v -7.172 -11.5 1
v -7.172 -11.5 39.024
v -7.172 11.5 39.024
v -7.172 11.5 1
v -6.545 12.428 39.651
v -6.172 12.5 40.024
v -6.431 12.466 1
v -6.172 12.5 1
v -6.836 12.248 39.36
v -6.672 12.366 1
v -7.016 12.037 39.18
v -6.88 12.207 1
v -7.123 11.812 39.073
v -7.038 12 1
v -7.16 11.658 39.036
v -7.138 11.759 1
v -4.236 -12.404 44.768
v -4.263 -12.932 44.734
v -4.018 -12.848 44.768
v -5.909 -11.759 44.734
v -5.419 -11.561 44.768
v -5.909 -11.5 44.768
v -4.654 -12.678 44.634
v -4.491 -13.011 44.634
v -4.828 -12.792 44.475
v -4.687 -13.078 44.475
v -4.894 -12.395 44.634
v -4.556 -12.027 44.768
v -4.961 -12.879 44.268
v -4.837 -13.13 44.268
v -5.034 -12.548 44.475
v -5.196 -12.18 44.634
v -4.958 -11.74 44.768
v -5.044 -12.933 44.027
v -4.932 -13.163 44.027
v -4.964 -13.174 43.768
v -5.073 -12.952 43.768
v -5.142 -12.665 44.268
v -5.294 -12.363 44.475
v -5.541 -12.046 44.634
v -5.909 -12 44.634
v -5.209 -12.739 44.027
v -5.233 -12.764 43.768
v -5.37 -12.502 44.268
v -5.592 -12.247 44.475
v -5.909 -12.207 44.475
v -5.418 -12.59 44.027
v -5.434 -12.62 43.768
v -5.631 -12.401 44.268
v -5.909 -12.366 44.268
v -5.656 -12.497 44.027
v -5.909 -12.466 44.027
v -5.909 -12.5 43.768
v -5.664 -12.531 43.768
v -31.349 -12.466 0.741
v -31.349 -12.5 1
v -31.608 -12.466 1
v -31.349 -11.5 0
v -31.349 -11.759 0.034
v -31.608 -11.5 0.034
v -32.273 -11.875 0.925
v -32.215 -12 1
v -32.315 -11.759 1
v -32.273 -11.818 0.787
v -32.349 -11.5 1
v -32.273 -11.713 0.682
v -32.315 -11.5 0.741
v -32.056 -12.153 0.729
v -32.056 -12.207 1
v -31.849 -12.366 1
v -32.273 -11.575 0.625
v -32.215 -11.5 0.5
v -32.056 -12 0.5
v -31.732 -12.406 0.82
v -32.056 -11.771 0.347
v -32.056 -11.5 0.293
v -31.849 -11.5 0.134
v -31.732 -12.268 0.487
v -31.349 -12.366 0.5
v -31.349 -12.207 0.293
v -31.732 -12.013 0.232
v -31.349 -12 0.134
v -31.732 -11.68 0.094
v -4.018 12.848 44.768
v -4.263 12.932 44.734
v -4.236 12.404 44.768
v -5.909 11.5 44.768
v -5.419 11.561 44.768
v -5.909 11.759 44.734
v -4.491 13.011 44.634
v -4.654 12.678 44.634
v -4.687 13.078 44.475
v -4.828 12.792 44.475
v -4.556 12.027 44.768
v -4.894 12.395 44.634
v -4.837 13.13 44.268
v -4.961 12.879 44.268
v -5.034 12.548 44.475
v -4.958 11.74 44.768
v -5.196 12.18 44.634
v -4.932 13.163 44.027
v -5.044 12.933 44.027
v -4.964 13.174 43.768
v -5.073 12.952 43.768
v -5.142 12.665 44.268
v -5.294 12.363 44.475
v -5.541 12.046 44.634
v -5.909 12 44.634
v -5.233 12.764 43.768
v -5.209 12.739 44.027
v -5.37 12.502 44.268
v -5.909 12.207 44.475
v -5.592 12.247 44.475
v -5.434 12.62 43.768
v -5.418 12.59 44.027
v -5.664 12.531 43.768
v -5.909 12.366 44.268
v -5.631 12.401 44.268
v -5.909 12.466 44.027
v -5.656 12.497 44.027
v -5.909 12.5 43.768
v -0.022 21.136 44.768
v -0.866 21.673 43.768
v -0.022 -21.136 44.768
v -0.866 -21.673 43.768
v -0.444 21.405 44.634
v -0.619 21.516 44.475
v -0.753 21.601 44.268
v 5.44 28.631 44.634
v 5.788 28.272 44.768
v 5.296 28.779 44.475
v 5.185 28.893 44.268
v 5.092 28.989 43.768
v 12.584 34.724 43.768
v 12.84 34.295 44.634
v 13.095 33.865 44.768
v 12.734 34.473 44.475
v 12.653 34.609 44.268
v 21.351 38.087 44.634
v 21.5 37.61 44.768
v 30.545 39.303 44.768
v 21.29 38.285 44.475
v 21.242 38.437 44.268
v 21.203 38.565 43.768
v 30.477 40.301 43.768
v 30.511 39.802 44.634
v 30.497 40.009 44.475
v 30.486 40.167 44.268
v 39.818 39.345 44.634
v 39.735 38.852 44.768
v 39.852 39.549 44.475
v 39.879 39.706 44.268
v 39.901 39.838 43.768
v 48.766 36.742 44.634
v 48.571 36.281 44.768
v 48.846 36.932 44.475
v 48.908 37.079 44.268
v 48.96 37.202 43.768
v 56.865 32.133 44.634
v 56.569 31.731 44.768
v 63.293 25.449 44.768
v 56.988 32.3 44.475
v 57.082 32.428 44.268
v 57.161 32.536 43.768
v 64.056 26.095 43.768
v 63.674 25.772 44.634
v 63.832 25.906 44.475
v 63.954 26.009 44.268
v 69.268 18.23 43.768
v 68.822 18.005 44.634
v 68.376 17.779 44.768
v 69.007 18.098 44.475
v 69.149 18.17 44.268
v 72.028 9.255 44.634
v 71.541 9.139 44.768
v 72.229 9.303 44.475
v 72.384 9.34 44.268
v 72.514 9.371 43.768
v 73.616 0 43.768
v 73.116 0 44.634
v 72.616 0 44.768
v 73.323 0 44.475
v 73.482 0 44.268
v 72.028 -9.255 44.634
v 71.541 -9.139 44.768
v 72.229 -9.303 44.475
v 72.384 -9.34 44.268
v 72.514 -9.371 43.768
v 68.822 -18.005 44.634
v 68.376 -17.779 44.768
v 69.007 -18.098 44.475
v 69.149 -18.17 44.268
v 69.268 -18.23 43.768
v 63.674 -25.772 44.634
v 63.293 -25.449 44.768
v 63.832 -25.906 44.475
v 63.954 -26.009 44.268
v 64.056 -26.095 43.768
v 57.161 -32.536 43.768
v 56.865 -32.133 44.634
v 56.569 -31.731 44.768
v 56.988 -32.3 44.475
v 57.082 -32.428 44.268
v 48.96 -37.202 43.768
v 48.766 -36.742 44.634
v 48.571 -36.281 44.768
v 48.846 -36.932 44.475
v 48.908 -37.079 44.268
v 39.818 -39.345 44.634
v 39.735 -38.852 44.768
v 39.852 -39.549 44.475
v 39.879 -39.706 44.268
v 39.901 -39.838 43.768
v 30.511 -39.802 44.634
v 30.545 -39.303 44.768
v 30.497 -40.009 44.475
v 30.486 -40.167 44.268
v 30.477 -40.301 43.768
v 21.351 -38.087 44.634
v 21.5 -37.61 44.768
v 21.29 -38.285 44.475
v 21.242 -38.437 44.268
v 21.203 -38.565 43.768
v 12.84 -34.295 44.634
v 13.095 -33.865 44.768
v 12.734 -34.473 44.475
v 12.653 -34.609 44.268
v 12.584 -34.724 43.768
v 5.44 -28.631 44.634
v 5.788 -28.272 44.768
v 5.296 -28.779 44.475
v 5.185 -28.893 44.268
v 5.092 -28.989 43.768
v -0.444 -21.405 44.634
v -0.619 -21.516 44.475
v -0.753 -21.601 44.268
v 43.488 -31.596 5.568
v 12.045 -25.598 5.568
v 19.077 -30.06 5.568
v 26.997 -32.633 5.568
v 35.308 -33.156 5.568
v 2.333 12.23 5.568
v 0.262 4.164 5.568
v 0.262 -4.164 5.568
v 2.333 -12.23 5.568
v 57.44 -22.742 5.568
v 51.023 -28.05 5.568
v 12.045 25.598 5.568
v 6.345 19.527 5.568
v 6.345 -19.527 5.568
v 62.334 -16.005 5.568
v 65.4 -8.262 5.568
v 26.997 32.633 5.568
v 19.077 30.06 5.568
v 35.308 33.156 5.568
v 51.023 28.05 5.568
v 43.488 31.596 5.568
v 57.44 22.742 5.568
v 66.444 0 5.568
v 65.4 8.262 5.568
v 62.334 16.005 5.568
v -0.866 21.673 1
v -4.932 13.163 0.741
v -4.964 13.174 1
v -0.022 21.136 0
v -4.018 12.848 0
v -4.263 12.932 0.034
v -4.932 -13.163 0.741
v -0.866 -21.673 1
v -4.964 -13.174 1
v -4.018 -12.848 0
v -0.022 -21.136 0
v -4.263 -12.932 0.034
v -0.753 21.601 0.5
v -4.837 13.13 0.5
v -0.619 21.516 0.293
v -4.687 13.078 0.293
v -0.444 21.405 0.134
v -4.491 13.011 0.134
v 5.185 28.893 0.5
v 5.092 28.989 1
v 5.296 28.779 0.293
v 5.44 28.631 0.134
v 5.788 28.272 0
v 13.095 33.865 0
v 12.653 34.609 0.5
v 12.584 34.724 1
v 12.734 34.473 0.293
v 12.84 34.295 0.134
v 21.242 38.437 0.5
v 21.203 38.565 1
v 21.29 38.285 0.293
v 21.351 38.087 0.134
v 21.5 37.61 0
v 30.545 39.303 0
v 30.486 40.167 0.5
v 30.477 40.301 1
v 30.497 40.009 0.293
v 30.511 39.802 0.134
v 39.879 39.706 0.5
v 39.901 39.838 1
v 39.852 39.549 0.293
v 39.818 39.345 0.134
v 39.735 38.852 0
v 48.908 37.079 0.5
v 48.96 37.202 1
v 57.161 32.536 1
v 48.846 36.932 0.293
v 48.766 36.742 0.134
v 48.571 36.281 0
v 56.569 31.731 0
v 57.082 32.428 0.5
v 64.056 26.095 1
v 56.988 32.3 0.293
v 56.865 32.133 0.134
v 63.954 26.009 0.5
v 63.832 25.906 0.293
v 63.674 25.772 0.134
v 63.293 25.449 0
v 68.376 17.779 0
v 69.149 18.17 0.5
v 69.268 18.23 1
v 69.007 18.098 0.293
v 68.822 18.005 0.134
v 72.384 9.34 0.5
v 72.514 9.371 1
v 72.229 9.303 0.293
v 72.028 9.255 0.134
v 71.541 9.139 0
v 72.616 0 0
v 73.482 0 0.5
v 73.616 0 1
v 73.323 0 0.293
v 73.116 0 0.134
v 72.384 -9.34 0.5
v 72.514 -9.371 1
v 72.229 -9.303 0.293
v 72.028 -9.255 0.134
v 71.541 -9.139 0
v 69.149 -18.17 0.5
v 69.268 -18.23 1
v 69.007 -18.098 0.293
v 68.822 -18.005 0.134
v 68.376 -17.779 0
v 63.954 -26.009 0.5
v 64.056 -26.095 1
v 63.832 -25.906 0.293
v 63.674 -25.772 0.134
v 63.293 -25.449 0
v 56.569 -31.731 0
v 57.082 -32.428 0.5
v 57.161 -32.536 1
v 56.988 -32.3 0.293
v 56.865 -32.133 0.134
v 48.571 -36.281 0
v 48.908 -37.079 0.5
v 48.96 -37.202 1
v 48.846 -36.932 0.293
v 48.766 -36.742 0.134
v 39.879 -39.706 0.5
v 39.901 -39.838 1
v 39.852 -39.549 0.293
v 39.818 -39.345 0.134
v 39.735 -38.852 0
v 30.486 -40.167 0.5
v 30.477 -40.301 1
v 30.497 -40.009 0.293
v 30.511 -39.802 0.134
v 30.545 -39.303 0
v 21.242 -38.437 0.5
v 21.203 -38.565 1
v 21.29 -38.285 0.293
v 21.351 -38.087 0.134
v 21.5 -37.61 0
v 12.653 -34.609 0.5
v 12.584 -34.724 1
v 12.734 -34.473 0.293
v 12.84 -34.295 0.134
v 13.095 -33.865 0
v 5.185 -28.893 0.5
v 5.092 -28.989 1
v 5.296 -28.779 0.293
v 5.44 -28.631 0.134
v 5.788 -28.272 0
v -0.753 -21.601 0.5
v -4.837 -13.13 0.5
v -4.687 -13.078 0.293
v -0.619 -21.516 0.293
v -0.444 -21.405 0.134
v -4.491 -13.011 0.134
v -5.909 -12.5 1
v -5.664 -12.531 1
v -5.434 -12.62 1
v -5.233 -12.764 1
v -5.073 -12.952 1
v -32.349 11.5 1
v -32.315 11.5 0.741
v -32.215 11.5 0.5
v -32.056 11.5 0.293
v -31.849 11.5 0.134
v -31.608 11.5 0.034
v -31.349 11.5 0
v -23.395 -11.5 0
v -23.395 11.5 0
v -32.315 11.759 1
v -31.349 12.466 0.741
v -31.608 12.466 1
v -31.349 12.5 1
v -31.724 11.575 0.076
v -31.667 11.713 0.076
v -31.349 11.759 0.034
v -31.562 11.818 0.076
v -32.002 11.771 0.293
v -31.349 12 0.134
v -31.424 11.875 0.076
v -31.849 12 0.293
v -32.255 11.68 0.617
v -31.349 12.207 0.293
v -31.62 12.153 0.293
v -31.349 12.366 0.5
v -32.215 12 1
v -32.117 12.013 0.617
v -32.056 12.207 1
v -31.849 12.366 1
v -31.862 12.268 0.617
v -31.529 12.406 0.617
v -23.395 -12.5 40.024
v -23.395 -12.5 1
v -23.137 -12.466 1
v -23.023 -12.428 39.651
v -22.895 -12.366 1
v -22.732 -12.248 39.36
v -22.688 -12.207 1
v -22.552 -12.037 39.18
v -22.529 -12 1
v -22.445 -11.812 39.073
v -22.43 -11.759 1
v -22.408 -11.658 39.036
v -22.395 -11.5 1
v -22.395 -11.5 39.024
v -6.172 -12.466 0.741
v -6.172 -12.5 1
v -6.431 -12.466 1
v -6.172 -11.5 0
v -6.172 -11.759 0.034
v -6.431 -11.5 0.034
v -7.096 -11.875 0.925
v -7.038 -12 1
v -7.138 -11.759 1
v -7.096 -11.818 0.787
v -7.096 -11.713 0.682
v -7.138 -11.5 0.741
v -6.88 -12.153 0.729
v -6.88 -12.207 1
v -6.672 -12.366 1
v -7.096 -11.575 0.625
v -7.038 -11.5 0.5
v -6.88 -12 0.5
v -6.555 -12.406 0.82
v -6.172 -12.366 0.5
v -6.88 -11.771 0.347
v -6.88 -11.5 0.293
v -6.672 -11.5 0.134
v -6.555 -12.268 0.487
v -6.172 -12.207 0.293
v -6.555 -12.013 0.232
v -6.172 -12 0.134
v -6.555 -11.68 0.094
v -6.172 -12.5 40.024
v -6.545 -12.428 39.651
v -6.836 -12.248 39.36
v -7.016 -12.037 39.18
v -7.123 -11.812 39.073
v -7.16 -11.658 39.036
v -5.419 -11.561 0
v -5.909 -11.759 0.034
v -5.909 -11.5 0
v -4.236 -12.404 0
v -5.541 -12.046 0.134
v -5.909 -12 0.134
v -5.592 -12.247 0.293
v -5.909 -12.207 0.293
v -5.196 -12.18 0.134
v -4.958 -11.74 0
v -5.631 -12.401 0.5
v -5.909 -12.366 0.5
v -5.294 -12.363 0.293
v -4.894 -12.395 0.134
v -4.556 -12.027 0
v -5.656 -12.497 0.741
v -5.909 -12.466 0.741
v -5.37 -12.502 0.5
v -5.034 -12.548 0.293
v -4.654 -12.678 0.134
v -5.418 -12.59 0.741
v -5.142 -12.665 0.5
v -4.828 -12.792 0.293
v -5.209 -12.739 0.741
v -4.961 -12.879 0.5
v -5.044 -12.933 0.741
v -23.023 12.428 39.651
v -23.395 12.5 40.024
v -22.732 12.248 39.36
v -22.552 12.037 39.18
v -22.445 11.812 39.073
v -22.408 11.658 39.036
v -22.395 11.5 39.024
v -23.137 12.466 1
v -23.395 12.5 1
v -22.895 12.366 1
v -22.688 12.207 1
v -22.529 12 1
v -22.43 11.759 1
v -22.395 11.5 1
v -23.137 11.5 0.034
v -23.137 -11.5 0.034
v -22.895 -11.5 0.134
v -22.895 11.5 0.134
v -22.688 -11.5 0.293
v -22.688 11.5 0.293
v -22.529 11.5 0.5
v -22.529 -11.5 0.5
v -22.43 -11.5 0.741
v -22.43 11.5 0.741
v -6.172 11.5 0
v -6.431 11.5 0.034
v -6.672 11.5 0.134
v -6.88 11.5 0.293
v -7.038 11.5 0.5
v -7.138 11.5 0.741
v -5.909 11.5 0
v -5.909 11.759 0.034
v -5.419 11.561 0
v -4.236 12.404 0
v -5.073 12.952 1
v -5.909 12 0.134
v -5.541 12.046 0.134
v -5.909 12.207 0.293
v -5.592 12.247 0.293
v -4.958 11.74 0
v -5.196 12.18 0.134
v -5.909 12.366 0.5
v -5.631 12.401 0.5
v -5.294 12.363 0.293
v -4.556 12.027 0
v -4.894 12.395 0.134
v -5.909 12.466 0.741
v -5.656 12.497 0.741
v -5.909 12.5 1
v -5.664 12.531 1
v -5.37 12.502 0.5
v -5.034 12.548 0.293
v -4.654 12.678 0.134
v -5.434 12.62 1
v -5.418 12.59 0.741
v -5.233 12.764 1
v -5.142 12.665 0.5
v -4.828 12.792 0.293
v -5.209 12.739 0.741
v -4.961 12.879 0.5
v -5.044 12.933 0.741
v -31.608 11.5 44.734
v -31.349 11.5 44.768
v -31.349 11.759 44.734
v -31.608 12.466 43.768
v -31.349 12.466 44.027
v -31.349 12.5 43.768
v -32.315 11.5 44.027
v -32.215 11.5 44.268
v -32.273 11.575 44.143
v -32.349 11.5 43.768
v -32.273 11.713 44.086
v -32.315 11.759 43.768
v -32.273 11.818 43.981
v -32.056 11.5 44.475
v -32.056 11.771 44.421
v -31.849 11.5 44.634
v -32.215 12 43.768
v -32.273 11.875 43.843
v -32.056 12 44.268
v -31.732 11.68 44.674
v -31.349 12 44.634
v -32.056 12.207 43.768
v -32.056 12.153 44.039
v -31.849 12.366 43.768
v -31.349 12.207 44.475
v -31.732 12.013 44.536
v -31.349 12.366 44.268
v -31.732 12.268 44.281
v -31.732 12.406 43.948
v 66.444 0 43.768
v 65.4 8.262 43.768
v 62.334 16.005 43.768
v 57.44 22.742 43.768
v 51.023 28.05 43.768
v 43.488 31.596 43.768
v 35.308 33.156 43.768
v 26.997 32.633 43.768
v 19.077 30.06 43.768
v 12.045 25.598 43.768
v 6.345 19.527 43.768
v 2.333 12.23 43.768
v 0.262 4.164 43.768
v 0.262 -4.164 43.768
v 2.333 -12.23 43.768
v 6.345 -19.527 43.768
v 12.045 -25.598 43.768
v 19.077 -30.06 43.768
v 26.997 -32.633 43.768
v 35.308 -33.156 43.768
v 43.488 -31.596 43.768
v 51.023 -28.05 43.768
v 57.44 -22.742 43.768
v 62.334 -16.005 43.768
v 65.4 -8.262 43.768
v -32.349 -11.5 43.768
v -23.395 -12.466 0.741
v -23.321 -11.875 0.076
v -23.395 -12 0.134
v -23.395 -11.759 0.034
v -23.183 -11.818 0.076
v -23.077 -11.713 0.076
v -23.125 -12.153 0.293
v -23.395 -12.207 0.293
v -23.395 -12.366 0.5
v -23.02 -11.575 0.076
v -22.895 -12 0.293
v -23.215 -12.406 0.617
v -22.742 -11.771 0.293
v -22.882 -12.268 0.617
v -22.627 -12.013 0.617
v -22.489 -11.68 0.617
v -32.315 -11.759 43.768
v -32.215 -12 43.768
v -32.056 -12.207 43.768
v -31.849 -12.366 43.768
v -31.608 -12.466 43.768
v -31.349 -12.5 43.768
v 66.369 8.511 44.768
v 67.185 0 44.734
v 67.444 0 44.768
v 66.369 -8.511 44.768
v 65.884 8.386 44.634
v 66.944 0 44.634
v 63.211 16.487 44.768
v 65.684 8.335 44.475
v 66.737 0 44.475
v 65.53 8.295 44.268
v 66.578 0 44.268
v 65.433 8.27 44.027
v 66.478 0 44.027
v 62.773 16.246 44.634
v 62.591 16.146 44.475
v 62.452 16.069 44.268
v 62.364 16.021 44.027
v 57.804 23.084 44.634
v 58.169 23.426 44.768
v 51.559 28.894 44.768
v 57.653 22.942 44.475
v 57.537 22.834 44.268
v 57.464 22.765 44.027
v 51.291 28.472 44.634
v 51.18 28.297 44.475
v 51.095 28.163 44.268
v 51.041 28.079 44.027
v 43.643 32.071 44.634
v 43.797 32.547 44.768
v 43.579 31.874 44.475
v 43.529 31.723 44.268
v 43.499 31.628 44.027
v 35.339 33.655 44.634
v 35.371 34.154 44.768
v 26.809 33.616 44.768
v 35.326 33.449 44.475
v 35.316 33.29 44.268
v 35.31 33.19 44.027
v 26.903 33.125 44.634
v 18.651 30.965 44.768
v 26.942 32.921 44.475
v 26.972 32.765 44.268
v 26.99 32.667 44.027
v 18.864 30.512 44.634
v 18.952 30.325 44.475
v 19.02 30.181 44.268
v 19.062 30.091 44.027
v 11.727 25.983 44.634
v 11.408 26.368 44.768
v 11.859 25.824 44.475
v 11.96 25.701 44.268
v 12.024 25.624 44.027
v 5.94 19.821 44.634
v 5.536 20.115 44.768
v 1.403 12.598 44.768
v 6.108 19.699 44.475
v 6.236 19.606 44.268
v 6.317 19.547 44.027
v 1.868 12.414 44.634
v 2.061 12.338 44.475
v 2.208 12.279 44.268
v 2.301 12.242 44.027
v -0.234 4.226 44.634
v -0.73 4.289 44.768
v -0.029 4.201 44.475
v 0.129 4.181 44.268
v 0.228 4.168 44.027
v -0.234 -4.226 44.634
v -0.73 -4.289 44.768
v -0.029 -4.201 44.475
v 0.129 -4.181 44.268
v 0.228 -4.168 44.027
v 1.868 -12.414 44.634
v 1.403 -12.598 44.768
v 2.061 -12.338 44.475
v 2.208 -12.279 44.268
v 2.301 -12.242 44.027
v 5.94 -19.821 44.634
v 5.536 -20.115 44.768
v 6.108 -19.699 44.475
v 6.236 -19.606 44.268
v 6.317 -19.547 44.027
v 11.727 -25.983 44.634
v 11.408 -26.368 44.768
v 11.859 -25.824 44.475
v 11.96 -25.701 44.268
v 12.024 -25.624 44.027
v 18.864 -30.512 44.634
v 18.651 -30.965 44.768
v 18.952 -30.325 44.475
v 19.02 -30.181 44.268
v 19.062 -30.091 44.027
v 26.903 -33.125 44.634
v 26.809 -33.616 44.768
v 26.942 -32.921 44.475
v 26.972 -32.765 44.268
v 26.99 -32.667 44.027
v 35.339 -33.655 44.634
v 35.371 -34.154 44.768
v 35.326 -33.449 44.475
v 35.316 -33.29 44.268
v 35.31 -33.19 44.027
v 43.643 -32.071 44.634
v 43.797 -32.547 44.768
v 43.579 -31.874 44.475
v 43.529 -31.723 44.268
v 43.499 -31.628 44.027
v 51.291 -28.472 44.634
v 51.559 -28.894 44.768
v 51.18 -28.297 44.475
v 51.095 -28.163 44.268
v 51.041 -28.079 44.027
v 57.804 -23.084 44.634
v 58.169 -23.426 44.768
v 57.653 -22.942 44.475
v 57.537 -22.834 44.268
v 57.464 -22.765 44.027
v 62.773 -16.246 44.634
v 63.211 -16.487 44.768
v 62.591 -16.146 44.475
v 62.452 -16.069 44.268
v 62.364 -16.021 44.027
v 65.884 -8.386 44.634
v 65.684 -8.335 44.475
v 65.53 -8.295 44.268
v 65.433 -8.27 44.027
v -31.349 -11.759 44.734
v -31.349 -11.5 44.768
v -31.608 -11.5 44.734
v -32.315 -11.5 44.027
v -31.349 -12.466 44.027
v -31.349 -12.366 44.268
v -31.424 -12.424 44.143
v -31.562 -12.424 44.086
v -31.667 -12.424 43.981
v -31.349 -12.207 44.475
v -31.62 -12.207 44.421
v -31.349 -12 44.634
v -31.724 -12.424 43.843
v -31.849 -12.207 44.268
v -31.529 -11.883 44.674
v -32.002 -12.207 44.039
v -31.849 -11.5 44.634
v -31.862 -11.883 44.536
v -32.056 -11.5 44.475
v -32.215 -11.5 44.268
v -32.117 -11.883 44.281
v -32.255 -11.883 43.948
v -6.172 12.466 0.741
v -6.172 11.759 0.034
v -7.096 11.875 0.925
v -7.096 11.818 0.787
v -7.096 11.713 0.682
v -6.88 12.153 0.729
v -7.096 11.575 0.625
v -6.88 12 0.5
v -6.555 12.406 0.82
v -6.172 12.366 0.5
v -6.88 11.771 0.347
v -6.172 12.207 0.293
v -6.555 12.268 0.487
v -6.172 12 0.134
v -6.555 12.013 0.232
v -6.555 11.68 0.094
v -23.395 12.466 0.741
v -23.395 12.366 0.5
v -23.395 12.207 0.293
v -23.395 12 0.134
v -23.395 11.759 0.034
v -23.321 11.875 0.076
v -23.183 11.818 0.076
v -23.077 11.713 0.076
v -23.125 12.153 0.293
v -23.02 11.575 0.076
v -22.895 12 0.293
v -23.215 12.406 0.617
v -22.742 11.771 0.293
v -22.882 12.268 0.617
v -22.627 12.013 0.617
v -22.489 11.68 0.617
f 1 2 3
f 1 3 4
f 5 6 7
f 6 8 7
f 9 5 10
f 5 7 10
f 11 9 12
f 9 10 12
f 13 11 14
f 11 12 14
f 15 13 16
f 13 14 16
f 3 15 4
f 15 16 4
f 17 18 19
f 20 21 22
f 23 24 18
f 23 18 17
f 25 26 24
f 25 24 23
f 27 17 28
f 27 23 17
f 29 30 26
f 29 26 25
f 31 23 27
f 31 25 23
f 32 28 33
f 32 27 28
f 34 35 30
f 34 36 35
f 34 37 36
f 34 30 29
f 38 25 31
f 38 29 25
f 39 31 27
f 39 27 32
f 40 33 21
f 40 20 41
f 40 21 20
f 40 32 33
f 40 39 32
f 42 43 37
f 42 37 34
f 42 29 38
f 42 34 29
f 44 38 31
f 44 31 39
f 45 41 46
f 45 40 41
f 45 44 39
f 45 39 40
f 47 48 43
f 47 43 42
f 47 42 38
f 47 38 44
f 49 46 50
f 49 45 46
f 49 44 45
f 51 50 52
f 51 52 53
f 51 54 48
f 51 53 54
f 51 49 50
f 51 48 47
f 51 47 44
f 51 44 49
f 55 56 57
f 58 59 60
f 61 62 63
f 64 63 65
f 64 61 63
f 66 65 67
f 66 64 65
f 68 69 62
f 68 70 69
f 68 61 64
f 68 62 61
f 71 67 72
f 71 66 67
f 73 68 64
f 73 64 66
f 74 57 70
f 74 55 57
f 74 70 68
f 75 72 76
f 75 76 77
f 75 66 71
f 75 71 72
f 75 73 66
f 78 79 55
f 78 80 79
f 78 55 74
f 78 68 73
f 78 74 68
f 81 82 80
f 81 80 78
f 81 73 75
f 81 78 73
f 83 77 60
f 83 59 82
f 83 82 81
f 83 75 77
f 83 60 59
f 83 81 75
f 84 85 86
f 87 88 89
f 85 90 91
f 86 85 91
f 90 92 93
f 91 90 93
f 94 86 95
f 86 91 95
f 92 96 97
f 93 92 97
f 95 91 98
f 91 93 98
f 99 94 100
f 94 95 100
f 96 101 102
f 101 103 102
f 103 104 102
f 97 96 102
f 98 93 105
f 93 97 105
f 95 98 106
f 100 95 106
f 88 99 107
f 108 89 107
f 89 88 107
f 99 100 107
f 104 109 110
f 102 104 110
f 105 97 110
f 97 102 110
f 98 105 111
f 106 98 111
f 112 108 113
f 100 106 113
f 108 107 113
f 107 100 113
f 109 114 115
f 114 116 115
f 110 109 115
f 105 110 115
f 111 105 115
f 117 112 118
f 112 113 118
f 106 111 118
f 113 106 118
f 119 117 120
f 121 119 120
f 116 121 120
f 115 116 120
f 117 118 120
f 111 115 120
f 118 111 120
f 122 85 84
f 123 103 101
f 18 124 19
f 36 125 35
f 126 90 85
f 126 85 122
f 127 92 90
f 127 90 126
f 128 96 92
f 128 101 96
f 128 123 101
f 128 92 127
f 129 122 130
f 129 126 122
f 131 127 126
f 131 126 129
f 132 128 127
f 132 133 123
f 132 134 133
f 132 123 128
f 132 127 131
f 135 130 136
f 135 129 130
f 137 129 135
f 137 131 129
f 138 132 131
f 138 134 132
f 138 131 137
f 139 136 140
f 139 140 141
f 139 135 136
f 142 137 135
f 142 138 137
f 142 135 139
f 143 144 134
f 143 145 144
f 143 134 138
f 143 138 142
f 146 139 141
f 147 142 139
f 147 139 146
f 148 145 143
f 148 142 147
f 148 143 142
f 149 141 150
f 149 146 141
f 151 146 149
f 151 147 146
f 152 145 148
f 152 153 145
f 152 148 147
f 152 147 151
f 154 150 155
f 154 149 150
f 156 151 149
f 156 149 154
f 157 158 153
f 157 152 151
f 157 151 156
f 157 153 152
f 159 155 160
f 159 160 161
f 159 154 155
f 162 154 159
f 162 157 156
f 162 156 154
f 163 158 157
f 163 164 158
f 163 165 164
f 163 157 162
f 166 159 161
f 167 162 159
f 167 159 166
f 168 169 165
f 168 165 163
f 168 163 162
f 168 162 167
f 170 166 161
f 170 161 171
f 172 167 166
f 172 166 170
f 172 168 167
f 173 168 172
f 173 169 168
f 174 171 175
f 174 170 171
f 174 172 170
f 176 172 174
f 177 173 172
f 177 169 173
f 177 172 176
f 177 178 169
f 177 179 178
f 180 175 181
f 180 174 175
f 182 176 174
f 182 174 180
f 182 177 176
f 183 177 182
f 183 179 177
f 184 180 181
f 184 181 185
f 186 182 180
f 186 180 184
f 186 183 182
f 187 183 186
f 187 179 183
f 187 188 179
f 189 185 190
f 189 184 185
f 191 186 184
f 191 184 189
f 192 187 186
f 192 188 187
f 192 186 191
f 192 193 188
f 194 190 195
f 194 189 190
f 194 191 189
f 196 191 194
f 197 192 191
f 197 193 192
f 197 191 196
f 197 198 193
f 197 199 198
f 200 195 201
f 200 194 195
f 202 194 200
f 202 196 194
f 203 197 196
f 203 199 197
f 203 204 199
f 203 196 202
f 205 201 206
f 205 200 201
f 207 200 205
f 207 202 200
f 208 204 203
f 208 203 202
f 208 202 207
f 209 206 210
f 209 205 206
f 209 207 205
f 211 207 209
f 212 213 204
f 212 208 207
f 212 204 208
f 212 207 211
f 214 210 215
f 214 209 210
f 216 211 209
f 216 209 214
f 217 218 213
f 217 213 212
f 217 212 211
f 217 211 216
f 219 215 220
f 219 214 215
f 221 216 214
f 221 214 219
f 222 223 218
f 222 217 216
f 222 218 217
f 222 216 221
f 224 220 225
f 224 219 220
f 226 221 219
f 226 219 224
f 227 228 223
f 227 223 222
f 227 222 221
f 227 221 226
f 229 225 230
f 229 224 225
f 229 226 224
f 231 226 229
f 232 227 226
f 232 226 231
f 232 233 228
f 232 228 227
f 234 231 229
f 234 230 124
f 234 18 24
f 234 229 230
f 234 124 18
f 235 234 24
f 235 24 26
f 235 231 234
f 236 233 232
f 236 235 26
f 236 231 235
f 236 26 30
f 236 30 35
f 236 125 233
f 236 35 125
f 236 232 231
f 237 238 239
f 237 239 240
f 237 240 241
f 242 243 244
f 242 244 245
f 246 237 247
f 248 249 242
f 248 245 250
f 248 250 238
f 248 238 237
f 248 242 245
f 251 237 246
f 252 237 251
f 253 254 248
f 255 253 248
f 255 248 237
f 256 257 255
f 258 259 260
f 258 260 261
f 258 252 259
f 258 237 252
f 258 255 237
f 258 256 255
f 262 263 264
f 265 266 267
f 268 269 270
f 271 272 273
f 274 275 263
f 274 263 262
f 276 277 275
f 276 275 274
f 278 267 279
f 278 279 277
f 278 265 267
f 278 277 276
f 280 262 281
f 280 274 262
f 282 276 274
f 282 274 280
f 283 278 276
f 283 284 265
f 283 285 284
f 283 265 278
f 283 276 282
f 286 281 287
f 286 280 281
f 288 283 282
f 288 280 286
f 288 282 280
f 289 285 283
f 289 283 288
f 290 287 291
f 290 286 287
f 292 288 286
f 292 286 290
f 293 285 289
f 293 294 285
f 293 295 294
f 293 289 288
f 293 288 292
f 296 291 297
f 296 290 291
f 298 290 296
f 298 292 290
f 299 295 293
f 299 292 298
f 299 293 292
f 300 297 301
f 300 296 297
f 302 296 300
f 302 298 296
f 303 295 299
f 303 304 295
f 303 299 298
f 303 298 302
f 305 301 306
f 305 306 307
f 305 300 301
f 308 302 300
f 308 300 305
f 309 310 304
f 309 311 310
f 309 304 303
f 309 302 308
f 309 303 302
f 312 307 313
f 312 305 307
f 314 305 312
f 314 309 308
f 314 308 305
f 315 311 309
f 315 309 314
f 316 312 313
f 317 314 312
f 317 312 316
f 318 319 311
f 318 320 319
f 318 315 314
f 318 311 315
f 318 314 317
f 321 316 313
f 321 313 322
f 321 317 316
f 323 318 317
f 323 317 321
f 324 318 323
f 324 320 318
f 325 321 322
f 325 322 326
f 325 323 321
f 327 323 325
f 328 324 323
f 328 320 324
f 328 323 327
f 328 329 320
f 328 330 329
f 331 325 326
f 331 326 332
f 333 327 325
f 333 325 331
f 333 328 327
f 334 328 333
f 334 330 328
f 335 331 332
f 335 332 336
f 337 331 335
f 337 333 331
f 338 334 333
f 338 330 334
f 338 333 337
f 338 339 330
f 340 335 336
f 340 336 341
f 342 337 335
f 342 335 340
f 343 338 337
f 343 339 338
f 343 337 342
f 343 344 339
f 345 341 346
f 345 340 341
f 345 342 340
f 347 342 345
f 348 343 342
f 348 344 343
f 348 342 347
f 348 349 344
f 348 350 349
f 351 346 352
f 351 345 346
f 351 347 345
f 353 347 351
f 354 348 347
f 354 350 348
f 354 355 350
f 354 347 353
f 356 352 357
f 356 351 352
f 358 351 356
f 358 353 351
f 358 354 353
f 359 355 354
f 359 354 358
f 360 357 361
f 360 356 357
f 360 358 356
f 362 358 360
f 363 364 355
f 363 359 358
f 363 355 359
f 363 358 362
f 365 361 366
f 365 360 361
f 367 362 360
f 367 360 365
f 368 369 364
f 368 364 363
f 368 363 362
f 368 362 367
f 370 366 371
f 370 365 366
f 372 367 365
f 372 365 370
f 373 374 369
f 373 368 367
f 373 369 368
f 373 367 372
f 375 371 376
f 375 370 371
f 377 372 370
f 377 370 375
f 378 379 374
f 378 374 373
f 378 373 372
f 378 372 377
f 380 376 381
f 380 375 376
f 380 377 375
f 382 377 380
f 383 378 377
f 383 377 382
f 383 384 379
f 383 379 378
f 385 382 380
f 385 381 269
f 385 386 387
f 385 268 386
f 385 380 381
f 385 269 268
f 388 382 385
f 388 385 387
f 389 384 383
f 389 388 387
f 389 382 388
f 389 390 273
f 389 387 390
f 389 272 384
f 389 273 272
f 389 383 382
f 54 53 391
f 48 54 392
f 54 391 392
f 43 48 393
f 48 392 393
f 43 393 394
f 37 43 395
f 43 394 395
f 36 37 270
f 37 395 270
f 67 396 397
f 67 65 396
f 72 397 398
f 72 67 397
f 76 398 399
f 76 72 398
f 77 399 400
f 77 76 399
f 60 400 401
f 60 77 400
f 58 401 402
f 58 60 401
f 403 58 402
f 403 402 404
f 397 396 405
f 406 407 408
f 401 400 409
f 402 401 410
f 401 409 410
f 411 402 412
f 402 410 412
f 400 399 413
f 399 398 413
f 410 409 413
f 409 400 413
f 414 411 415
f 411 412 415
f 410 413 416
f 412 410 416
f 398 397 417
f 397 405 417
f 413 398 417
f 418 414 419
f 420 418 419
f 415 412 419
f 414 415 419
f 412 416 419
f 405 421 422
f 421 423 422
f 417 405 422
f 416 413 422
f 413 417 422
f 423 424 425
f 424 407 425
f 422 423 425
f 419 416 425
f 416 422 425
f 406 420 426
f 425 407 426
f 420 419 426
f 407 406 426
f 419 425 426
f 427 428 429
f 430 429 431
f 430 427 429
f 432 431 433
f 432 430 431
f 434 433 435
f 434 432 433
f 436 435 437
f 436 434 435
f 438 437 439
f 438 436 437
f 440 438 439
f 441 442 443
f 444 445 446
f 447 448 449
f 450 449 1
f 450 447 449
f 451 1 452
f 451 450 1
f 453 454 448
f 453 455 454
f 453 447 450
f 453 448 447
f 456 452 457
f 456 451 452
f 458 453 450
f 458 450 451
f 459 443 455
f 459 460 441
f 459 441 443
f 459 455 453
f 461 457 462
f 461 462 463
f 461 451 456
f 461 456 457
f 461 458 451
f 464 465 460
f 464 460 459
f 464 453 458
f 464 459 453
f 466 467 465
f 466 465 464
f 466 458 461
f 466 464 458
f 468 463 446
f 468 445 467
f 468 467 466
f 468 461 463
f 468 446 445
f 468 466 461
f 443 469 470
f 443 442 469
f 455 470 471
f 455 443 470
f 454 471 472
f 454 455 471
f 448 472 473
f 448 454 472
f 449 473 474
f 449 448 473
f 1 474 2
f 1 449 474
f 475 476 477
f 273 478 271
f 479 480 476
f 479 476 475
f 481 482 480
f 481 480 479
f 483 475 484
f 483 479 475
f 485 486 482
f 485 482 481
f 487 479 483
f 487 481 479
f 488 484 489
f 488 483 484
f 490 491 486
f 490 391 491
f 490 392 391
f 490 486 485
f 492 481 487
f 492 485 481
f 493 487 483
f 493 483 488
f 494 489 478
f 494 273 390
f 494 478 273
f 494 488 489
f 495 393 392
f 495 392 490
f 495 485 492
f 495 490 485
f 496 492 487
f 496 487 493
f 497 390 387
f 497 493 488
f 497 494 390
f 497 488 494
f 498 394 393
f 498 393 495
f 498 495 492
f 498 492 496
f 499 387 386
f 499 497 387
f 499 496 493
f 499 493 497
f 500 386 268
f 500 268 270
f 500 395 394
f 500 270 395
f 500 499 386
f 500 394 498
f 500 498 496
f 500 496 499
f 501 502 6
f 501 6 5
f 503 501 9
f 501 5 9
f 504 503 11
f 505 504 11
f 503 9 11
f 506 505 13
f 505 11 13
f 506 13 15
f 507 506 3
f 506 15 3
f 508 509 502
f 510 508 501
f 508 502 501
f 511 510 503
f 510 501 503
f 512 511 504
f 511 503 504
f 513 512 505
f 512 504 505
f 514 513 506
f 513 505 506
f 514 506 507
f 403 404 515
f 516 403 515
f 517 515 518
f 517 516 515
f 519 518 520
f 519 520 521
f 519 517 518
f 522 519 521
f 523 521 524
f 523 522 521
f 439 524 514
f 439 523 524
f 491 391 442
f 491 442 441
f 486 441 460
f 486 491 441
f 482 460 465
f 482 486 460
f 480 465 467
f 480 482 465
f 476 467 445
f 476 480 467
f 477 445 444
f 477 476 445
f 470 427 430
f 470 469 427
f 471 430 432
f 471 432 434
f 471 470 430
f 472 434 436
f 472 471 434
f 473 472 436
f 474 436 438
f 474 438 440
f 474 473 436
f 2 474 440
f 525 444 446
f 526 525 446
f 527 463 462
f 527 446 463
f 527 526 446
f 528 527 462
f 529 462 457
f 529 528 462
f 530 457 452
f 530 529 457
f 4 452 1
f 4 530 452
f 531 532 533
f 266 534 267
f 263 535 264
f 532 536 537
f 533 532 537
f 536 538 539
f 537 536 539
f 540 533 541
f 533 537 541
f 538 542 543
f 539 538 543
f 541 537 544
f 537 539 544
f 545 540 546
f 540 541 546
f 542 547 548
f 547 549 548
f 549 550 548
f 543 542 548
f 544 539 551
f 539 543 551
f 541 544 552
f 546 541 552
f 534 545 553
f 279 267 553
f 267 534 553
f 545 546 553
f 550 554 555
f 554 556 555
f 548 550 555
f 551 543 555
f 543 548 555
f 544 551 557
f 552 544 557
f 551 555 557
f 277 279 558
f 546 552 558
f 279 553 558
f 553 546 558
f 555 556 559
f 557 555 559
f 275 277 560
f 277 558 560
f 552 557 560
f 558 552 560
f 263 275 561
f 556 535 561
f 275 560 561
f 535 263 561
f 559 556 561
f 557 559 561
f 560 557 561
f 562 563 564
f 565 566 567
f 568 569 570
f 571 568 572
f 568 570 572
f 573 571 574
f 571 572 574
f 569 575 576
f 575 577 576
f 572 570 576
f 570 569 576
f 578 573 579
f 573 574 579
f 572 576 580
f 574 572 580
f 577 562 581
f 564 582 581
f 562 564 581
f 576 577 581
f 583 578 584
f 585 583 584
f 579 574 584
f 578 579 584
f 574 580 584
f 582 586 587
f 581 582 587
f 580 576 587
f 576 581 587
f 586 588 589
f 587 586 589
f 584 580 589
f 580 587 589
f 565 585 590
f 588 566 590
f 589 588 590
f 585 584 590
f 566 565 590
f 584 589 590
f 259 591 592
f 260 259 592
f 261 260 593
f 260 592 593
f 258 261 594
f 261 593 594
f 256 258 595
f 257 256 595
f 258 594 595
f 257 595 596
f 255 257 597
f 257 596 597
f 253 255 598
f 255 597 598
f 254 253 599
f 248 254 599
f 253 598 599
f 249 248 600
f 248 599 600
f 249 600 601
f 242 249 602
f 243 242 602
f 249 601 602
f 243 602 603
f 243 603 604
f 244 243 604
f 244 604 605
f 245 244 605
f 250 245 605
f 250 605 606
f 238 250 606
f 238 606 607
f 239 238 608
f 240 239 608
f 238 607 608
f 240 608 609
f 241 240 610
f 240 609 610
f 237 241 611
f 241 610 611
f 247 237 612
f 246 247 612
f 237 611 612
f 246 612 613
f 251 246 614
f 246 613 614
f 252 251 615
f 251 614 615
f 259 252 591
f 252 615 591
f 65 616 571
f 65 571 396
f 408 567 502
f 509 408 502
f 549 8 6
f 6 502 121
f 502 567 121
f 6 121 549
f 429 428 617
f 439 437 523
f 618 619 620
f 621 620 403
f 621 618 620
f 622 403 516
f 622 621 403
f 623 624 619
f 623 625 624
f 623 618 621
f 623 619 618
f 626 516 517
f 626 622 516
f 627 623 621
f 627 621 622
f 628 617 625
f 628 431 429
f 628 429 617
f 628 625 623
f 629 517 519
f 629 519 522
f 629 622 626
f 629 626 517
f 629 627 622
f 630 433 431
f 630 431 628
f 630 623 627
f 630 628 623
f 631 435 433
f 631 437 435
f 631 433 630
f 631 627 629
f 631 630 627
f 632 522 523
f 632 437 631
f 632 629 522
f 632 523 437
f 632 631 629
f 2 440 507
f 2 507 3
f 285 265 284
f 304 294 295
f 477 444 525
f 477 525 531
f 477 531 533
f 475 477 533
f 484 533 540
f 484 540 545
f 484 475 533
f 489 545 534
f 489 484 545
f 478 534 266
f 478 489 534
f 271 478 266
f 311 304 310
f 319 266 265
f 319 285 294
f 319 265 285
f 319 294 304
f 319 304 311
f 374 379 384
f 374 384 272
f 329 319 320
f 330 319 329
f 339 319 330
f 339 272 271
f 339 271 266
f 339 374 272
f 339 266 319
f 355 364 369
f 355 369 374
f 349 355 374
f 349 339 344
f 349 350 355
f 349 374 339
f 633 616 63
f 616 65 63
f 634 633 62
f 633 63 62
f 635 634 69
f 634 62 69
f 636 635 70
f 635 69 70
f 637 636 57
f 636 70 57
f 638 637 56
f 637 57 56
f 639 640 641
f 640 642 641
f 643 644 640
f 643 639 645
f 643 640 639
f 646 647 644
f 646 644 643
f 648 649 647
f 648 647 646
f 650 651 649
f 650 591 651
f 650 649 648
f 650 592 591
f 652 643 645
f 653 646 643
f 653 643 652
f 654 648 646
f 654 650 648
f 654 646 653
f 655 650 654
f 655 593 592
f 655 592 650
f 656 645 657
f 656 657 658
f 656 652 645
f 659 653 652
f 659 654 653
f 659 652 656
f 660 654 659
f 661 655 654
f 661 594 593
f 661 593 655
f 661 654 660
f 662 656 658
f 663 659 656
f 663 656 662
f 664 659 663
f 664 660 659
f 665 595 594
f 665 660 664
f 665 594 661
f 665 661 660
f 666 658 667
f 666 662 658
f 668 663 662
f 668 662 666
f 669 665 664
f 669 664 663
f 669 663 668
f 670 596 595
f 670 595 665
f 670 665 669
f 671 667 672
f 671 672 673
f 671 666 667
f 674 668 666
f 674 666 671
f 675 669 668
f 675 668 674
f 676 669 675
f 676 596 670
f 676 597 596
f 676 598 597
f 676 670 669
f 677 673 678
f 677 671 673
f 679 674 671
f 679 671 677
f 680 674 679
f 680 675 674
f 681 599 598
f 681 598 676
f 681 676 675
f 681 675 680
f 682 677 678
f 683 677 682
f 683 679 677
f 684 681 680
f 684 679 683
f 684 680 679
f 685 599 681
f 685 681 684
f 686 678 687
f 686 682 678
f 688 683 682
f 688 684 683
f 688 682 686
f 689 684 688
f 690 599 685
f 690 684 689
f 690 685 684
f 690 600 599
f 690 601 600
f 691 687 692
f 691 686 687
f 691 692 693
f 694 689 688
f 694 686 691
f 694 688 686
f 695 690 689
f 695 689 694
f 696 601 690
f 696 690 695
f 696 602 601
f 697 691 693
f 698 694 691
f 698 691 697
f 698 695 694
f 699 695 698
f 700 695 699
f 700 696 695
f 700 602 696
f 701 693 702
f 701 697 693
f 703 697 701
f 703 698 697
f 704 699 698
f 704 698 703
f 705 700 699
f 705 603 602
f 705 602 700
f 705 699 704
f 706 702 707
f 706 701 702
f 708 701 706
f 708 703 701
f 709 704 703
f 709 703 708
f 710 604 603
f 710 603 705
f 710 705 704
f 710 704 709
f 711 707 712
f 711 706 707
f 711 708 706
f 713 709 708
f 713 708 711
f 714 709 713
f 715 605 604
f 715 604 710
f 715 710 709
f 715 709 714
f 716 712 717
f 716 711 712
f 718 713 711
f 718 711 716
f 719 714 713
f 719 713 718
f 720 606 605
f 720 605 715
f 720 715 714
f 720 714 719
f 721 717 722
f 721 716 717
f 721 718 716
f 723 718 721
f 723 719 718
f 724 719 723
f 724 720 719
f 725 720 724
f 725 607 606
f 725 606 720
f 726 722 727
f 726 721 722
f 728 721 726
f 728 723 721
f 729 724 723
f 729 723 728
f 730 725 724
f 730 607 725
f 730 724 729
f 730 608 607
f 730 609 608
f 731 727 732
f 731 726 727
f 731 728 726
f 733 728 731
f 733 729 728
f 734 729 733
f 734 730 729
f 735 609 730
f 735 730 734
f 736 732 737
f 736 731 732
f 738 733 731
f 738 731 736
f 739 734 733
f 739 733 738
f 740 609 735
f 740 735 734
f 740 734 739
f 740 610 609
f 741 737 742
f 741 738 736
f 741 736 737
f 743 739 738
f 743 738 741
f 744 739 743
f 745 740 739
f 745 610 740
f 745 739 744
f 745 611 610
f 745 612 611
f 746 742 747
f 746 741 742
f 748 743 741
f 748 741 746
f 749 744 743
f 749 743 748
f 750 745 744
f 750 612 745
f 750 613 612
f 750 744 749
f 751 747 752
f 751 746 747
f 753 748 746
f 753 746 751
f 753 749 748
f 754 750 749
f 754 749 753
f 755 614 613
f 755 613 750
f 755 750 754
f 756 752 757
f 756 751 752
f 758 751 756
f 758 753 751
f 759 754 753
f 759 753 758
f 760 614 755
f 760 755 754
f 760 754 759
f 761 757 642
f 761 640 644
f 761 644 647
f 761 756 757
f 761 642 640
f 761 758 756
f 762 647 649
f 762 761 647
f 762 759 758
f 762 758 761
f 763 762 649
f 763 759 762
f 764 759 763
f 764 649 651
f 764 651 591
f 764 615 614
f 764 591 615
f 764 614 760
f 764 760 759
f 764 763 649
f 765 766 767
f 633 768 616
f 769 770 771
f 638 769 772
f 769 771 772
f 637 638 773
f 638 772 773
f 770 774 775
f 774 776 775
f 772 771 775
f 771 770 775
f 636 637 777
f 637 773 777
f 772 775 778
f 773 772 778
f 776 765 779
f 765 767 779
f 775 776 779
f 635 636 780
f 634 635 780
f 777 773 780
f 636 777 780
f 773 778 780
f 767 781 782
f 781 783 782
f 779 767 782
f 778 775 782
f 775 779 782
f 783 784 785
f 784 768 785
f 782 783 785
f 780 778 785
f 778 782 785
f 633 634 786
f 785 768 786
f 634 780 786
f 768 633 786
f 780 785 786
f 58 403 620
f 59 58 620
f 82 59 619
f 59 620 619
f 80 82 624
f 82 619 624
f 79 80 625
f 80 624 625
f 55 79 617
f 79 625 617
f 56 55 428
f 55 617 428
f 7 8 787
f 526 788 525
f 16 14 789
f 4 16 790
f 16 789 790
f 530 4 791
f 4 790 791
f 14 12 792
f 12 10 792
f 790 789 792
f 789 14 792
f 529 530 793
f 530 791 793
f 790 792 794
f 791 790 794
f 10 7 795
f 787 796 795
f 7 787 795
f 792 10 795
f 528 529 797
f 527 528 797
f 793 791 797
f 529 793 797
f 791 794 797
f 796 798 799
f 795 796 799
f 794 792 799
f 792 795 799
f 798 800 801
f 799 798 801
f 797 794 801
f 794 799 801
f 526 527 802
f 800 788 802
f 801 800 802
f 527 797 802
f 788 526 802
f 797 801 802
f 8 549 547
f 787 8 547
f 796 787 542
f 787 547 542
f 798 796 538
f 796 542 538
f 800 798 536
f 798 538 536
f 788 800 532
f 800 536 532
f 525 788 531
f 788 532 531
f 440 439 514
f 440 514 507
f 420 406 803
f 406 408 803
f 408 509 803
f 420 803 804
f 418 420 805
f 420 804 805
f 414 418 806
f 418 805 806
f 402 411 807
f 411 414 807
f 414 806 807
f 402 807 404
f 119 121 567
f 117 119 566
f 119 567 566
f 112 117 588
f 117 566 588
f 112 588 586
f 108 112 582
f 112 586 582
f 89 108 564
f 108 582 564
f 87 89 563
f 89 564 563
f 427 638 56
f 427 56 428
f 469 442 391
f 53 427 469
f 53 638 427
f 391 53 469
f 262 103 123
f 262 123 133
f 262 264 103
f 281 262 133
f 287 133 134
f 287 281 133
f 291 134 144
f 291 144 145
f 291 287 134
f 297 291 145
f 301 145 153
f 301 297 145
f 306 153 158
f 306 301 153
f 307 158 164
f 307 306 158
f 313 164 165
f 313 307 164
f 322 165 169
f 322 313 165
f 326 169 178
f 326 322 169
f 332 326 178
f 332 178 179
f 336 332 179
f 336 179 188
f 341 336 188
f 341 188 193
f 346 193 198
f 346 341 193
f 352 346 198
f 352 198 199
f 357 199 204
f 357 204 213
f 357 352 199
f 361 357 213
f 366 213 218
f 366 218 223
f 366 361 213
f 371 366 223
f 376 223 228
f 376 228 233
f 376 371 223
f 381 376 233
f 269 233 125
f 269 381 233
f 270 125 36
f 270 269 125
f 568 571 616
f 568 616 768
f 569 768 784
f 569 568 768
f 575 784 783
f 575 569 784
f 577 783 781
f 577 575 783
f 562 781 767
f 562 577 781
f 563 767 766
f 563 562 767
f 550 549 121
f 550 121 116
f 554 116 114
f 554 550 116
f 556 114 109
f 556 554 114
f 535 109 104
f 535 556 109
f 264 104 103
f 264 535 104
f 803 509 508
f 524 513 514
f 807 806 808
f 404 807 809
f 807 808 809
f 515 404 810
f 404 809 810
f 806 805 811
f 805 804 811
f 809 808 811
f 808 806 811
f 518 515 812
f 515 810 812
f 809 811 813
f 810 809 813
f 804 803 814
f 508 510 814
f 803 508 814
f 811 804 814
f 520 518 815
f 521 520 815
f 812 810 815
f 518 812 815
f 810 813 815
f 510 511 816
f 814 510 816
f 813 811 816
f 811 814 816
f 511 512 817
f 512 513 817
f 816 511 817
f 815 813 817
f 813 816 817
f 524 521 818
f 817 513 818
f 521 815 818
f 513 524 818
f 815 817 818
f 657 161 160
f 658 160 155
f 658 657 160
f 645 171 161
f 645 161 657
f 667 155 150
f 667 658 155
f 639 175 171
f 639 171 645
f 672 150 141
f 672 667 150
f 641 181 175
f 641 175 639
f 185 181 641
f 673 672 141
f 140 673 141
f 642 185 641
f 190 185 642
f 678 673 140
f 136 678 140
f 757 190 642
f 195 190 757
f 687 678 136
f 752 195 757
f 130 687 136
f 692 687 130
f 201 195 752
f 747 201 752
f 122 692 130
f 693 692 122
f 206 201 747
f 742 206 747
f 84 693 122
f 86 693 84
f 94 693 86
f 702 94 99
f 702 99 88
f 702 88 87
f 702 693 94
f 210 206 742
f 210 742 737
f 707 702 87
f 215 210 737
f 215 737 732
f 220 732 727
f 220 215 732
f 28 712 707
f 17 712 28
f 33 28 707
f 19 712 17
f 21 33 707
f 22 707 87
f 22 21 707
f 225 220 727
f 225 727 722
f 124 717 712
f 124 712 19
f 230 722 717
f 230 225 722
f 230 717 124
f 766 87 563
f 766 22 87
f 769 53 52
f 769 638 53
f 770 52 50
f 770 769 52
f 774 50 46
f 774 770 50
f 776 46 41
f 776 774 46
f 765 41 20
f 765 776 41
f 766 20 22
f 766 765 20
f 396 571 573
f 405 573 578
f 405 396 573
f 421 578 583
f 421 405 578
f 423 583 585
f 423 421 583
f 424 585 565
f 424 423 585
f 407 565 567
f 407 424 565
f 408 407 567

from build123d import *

# Parameters (mm, degrees)
F2_DEPTH = 12.5
F3_R     = 33.2218818367
F4_DEPTH = 39.2
F5_R     = 1


with BuildPart() as f1:
    # F0 (on Front) → F1 (revolve)
    with BuildSketch(Plane.XZ):
        Polygon((33.2218818367, 44.7680167854), (-7.1723973379, 44.7680167854), (-7.1723973379, 39.0236787498), (-7.1723973379, 0), (33.2218818367, 0), align=None)
    revolve(axis=Axis((33.2218818367, 0, 22.3840083927), (0, 0, -1)))

    # F0 (on Front) → F2 (join, symmetric)
    with BuildSketch(Plane.XZ):
        Polygon((-32.3489792645, 44.7680167854), (-32.3489792645, 0), (-22.3954468966, 0), (-22.3954468966, 39.0236787498), (-7.1723973379, 39.0236787498), (-7.1723973379, 44.7680167854), (-22.3954468966, 44.7680167854), align=None)
        Polygon((33.2218818367, 44.7680167854), (-7.1723973379, 44.7680167854), (-7.1723973379, 39.0236787498), (-7.1723973379, 0), (33.2218818367, 0), align=None)
    extrude(amount=F2_DEPTH, both=True)

    # F3 (on face) → F4 (cut)
    with BuildSketch(Plane.XY.offset(44.7680167854)):
        with Locations((33.2218818367, 0)):
            Circle(F3_R)
    extrude(amount=-F4_DEPTH, mode=Mode.SUBTRACT)

    # F5
    f5_edges = [f1.edges().sort_by_distance(p)[0] for p in [
        (73.616161, 0, 44.768017),
        (0, 0, 44.768017),
        (-18.769328, 12.5, 44.768017),
        (-32.348979, 0, 44.768017),
        (-18.769328, -12.5, 44.768017),
        (-5.189676, -12.5, 22.384008),
        (-6.181037, -12.5, 0),
        (-7.172397, -12.5, 19.511839),
        (-14.783922, -12.5, 39.023679),
        (-22.395447, -12.5, 19.511839),
        (-27.372213, -12.5, 0),
        (-32.348979, -12.5, 22.384008),
        (-32.348979, 12.5, 22.384008),
        (-32.348979, 0, 0),
        (-5.189676, 12.5, 22.384008),
        (-6.181037, 12.5, 0),
        (-7.172397, 12.5, 19.511839),
        (-14.783922, 12.5, 39.023679),
        (-22.395447, 12.5, 19.511839),
        (-27.372213, 12.5, 0),
        (73.616161, 0, 0),
        (-7.172397, 0, 0),
        (-22.395447, 0, 0),
    ]]
    fillet(f5_edges, radius=F5_R)


solid = f1.part
